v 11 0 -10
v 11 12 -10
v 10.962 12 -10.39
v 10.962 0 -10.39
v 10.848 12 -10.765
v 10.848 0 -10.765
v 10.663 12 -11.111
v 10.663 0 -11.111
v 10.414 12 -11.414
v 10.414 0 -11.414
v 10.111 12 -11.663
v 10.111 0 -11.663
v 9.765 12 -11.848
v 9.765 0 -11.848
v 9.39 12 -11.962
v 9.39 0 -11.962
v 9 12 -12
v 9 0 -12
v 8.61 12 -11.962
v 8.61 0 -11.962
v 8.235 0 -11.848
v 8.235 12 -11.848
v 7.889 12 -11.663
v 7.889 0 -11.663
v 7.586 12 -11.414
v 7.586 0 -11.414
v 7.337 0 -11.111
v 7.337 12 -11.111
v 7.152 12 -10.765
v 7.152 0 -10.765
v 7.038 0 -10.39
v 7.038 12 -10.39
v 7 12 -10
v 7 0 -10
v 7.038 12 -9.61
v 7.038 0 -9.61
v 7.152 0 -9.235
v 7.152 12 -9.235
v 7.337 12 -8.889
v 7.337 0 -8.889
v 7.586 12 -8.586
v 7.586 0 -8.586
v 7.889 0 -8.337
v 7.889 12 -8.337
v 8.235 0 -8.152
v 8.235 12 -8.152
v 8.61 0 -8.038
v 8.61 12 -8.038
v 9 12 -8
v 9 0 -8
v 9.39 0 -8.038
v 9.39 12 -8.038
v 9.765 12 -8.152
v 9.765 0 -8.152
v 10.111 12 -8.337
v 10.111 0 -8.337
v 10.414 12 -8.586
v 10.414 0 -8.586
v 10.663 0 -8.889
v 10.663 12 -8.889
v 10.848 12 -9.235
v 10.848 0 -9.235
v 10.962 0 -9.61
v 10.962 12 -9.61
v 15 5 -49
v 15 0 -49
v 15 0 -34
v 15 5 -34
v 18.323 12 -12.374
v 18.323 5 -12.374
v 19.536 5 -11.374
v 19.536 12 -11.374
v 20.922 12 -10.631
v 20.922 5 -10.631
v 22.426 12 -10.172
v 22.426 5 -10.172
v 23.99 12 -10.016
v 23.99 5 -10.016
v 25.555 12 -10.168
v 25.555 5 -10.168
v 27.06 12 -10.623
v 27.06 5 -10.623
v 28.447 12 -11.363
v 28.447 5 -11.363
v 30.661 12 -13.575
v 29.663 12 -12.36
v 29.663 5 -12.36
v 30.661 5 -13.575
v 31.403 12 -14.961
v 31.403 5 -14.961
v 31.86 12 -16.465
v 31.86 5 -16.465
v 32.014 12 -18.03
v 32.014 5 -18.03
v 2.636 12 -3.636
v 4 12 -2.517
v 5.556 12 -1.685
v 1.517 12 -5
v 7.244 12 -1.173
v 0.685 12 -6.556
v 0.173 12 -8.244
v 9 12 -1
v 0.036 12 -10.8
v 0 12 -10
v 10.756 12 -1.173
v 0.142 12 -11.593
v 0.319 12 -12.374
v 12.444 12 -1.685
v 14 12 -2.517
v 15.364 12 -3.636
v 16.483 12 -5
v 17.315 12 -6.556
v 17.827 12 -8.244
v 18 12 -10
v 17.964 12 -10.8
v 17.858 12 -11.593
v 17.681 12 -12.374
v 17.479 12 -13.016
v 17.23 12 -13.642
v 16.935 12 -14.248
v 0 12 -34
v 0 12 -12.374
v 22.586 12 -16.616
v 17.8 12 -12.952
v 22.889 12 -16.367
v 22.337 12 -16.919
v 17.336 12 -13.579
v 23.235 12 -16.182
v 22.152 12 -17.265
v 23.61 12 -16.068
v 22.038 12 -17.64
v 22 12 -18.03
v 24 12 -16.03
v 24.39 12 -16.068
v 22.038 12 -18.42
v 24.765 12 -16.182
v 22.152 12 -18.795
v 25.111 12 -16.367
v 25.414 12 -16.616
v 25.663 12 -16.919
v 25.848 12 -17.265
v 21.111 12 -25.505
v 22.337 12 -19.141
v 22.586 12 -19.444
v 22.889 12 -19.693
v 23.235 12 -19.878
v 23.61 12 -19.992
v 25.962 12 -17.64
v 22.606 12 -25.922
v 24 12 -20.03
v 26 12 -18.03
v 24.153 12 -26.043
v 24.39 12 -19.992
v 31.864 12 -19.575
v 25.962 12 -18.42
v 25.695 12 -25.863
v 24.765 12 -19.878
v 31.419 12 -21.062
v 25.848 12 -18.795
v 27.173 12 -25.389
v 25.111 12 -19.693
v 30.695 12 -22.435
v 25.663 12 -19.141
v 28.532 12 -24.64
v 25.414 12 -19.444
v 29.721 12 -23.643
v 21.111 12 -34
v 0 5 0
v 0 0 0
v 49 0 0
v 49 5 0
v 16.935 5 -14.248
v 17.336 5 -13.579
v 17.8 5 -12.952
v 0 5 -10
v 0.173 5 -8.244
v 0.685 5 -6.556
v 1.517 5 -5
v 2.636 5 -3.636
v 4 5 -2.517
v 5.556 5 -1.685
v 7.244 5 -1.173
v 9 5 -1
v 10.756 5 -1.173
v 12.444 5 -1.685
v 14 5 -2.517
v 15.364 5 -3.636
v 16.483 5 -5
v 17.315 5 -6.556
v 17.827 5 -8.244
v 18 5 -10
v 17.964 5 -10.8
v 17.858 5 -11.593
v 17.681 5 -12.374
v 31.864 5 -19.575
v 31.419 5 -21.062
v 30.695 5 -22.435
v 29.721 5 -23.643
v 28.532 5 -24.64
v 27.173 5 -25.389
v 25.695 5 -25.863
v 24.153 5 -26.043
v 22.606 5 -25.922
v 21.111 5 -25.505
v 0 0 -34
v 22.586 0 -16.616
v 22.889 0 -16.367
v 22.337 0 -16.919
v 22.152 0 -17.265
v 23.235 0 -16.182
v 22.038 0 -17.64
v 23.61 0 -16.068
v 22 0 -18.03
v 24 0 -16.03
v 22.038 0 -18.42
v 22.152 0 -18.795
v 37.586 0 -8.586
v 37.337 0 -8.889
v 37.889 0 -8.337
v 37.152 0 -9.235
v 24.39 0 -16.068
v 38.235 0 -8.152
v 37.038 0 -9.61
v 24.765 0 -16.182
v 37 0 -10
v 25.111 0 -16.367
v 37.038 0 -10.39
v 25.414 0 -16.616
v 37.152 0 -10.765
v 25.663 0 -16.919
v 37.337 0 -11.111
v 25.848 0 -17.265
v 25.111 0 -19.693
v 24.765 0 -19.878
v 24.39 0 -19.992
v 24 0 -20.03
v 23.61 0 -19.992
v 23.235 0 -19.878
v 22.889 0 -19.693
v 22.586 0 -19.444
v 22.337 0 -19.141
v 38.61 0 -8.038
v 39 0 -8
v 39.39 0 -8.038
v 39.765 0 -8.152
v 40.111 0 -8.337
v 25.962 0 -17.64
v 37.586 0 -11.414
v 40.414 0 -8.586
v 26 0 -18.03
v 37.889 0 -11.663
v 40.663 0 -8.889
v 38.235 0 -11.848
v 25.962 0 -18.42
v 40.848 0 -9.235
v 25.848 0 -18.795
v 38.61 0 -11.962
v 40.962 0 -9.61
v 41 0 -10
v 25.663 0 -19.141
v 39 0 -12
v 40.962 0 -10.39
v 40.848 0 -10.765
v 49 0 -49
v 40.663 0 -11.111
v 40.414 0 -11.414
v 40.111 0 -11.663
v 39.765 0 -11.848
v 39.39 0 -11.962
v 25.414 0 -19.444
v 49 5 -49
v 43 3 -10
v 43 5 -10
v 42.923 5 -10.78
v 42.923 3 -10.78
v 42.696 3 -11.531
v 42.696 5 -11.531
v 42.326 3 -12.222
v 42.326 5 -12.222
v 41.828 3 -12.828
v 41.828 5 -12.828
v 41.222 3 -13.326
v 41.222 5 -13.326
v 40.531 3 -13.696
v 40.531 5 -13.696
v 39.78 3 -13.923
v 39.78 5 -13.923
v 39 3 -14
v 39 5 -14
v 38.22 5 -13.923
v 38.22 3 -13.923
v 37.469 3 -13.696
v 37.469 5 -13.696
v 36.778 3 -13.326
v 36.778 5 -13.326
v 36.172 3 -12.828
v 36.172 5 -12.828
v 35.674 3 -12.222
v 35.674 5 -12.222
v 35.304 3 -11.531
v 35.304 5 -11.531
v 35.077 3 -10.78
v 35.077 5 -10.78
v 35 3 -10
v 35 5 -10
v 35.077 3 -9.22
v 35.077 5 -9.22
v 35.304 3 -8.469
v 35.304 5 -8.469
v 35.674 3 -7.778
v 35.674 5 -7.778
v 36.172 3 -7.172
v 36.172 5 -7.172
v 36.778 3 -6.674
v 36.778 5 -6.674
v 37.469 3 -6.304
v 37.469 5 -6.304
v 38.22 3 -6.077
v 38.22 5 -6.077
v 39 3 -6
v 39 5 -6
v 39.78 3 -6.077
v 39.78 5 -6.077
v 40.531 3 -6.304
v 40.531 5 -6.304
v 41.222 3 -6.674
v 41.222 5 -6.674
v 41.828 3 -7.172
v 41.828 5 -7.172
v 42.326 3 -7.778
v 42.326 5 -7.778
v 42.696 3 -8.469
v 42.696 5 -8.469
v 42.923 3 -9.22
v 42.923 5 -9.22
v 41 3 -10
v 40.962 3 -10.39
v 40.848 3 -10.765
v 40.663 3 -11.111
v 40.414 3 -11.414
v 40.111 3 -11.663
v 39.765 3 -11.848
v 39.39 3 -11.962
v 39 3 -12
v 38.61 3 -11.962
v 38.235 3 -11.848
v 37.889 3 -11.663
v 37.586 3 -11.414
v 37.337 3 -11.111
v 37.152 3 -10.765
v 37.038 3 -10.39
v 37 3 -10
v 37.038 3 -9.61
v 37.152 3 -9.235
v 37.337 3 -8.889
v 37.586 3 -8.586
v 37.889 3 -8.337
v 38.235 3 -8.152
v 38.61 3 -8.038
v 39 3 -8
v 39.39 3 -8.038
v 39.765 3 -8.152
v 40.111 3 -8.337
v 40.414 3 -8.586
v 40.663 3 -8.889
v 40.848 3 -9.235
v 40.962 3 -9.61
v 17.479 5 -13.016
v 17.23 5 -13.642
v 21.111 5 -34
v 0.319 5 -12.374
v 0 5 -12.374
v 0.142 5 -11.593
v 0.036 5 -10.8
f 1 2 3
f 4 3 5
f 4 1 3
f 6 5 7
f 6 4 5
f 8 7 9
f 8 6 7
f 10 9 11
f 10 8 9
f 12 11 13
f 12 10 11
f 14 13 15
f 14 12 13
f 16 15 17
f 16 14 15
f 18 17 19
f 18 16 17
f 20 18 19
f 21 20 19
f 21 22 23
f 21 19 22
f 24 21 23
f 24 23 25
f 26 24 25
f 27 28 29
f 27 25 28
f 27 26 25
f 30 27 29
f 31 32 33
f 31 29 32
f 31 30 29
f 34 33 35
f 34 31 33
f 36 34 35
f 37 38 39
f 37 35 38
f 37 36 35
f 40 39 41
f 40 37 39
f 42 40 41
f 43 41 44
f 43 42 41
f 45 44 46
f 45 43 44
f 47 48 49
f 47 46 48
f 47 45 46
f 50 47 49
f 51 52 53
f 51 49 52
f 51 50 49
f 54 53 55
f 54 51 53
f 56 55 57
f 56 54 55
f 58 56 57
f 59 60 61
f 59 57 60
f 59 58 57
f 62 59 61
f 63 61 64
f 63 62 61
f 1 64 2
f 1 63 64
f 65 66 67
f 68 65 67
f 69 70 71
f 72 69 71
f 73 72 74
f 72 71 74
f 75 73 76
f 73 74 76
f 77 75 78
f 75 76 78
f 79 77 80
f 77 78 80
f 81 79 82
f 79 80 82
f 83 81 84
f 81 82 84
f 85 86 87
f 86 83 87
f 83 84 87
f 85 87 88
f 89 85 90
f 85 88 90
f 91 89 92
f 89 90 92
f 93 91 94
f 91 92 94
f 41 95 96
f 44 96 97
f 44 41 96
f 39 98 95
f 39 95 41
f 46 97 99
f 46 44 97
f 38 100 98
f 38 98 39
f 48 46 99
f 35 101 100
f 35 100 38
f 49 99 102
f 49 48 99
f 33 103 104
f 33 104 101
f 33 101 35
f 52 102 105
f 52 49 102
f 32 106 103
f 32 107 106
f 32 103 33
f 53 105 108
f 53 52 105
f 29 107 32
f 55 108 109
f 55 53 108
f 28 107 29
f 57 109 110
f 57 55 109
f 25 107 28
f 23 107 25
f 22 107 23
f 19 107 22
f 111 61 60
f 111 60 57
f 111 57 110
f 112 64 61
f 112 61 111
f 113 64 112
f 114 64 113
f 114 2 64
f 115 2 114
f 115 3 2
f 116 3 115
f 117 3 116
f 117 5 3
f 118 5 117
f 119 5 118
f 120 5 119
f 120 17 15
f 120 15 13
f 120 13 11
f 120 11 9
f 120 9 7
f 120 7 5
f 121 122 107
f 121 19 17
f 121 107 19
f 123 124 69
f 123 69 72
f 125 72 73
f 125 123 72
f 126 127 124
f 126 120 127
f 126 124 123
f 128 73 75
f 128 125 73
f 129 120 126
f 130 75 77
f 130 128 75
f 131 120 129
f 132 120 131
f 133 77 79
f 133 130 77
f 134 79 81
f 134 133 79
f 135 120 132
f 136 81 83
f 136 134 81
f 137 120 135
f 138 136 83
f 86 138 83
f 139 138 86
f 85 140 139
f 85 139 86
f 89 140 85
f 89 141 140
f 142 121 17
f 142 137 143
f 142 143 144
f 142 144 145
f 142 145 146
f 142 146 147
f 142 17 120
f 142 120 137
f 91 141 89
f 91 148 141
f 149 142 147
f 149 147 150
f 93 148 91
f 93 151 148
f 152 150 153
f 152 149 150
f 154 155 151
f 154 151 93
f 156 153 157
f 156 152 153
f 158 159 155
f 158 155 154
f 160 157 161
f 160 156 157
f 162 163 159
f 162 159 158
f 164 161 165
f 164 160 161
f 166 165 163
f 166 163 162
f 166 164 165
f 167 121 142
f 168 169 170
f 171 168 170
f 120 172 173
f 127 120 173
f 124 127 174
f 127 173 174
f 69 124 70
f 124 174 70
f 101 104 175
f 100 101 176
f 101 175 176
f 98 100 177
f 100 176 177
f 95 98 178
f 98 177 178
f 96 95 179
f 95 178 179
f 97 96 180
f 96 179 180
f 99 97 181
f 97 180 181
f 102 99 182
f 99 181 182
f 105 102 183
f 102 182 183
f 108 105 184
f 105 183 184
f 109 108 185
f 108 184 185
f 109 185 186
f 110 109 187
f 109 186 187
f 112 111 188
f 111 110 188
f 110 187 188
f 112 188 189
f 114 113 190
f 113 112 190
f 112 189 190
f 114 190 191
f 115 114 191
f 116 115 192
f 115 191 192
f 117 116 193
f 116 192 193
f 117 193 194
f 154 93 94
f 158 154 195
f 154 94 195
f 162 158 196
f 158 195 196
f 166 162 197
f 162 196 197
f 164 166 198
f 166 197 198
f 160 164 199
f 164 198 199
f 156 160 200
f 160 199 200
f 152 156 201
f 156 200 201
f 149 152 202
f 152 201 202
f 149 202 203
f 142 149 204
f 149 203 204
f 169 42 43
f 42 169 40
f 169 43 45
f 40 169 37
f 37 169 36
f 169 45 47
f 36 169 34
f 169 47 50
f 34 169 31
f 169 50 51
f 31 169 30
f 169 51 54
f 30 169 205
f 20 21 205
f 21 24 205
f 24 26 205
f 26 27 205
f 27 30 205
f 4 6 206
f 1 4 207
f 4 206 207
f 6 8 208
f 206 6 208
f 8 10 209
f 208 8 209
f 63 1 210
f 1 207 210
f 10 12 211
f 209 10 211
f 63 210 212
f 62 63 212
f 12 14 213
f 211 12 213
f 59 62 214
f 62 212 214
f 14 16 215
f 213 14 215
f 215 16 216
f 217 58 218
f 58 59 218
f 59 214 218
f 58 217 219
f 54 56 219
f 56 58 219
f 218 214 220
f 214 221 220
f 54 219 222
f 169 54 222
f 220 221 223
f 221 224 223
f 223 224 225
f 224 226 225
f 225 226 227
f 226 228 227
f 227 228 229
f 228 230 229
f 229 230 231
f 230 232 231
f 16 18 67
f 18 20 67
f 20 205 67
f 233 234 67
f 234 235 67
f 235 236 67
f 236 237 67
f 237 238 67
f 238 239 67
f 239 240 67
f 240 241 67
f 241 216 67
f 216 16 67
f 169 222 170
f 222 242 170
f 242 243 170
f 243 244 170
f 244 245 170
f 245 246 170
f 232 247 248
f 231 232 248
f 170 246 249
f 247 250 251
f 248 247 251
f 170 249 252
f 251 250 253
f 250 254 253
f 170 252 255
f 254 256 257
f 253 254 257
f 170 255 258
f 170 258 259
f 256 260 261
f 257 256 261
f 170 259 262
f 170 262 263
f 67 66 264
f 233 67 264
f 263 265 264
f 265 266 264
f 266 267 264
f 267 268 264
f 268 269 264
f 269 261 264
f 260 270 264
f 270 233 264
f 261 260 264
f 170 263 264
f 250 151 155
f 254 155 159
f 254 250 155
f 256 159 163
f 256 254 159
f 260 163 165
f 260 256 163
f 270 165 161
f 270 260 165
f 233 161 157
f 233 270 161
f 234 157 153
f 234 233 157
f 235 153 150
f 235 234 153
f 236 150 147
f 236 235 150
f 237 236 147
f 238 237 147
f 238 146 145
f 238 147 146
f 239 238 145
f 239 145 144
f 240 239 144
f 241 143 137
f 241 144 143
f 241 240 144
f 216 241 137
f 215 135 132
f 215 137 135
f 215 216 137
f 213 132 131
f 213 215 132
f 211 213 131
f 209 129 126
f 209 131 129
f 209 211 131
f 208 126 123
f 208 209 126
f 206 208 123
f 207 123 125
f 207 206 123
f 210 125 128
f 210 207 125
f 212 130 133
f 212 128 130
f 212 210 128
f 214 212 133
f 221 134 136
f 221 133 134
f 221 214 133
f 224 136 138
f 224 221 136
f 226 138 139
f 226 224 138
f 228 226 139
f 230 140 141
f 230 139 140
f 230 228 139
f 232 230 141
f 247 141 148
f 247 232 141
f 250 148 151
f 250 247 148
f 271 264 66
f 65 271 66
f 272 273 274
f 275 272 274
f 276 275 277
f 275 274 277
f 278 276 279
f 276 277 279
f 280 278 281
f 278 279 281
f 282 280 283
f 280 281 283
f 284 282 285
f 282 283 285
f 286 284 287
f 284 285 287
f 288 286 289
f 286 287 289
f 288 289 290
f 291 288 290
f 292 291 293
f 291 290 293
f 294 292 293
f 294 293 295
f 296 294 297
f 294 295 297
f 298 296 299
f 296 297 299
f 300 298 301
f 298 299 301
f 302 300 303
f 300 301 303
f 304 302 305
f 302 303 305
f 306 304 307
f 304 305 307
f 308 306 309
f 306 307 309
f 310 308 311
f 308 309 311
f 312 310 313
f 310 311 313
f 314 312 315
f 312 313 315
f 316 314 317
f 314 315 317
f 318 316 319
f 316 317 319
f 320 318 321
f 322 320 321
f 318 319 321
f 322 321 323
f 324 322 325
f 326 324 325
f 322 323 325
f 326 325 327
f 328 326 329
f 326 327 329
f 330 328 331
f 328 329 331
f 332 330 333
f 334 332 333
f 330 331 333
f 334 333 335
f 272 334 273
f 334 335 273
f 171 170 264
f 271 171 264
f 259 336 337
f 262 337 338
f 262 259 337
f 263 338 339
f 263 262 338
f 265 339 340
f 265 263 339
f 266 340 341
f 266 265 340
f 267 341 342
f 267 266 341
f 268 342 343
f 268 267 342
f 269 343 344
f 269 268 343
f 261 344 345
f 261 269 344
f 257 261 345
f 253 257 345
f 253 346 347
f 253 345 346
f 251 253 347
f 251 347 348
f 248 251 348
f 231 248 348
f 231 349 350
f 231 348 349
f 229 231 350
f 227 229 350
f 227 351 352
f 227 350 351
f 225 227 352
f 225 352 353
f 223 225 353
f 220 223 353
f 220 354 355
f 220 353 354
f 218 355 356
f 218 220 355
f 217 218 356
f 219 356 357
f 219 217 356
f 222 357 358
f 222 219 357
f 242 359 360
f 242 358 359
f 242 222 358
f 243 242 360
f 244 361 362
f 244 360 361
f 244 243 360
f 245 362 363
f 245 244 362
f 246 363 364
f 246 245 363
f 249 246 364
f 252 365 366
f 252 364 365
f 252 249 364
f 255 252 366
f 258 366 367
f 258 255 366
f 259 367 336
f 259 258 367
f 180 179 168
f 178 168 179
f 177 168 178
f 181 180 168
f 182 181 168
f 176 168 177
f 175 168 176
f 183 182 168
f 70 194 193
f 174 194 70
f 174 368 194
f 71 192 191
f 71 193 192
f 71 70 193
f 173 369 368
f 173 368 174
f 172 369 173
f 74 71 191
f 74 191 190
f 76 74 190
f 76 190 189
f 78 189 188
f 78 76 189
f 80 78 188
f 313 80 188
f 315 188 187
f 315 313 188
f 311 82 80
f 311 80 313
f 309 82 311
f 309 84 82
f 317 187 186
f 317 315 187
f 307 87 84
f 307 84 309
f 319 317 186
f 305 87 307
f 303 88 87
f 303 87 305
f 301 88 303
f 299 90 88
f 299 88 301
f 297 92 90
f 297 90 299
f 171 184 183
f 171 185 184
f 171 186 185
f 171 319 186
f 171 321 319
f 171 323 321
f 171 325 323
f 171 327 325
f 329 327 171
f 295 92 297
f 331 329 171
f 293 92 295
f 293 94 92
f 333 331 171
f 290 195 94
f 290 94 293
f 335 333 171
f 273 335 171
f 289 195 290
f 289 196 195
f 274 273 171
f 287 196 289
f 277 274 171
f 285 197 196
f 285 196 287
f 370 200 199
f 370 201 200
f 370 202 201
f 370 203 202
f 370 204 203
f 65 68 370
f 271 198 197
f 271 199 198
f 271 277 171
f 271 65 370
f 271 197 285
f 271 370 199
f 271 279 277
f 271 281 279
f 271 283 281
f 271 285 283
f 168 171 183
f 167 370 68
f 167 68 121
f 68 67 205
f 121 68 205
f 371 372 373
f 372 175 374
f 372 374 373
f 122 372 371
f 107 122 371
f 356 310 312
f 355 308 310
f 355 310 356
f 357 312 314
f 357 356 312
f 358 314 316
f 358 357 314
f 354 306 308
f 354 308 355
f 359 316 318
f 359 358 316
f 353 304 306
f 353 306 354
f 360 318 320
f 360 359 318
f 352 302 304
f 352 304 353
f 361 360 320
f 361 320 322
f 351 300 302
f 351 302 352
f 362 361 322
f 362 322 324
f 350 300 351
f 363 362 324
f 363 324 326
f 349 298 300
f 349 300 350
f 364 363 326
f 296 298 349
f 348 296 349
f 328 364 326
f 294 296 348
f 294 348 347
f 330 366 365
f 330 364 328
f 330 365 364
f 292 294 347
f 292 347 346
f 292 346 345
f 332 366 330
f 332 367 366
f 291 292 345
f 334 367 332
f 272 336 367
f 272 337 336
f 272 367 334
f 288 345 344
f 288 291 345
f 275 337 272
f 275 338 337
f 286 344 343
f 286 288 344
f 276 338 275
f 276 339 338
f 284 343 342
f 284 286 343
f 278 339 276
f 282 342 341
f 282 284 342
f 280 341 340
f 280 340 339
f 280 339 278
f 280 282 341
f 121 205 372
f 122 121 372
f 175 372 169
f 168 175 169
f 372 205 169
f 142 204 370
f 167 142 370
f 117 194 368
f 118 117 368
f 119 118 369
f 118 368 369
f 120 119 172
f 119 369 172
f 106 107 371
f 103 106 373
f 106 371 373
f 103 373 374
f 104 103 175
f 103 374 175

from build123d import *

# Parameters (mm, degrees)
SKETCH1_R           = 2
BOSS_EXTRUDE1_DEPTH = 5
SKETCH2_R           = 4
CUT_EXTRUDE1_DEPTH  = 2
SKETCH3_R           = 2
BOSS_EXTRUDE2_DEPTH = 12
SKETCH4_W           = 51.589864231
SKETCH4_H           = 45.63525298
CUT_EXTRUDE2_DEPTH  = 5


with BuildPart() as part:
    # Sketch1 → Boss-Extrude1 (new body)
    with BuildSketch(Plane(origin=(0, 0, 0), x_dir=(1, 0, 0), z_dir=(0, 1, 0))):
        Polygon((0, 34), (0, 0), (49, 0), (49, 49), (15, 49), (15, 34), align=None)
        with Locations((9, 10)):
            Circle(SKETCH1_R, mode=Mode.SUBTRACT)
        with Locations((24, 18.03)):
            Circle(SKETCH1_R, mode=Mode.SUBTRACT)
        with Locations((39, 10)):
            Circle(SKETCH1_R, mode=Mode.SUBTRACT)
    extrude(amount=BOSS_EXTRUDE1_DEPTH)

    # Sketch2 → Cut-Extrude1 (cut)
    with BuildSketch(Plane(origin=(0, 5, 0), x_dir=(1, 0, 0), z_dir=(0, 1, 0))):
        with Locations((39, 10)):
            Circle(SKETCH2_R)
    extrude(amount=-CUT_EXTRUDE1_DEPTH, mode=Mode.SUBTRACT)

    # Sketch3 → Boss-Extrude2 (add)
    with BuildSketch(Plane(origin=(0, 5, 0), x_dir=(1, 0, 0), z_dir=(0, 1, 0))):
        with BuildLine():
            Line((15, 34), (0, 34))
            Line((0, 34), (0, 12.373527554))
            Line((0, 12.373527554), (0.318619525, 12.373527554))
            ThreePointArc((0.318619525, 12.373527554), (7.991284246, 18.943293159), (16.934577194, 14.247644612))
            ThreePointArc((16.934577194, 14.247644612), (16.486188802, 20.817302098), (21.110631854, 25.505156415))
            Line((21.110631854, 25.505156415), (21.110631854, 34))
            Line((21.110631854, 34), (15, 34))
        make_face()
        with BuildLine():
            Line((21.110631854, 12.373527554), (21.110631854, 25.505156415))
            ThreePointArc((21.110631854, 25.505156415), (16.486188802, 20.817302098), (16.934577194, 14.247644612))
            ThreePointArc((16.934577194, 14.247644612), (17.560142752, 13.25981653), (18.322788434, 12.373527554))
            Line((18.322788434, 12.373527554), (21.110631854, 12.373527554))
        make_face()
        with BuildLine():
            ThreePointArc((16.934577194, 14.247644612), (7.991284246, 18.943293159), (0.318619525, 12.373527554))
            Line((0.318619525, 12.373527554), (17.681380475, 12.373527554))
            ThreePointArc((17.681380475, 12.373527554), (17.360657331, 13.331577554), (16.934577194, 14.247644612))
        make_face()
        with BuildLine():
            ThreePointArc((32.014138239, 18.03), (28.531590006, 24.639924638), (21.110631854, 25.505156415))
            Line((21.110631854, 25.505156415), (21.110631854, 12.373527554))
            Line((21.110631854, 12.373527554), (18.322788434, 12.373527554))
            ThreePointArc((18.322788434, 12.373527554), (27.060102401, 10.623098826), (32.014138239, 18.03))
        make_face()
        with Locations((24, 18.03)):
            Circle(SKETCH3_R, mode=Mode.SUBTRACT)
        with BuildLine():
            Line((17.681380475, 12.373527554), (0.318619525, 12.373527554))
            ThreePointArc((0.318619525, 12.373527554), (0.08001053, 11.197408812), (0, 10))
            ThreePointArc((0, 10), (9, 1), (18, 10))
            ThreePointArc((18, 10), (17.91998947, 11.197408812), (17.681380475, 12.373527554))
        make_face()
        with Locations((9, 10)):
            Circle(SKETCH3_R, mode=Mode.SUBTRACT)
    extrude(amount=BOSS_EXTRUDE2_DEPTH)

    # Sketch4 → Cut-Extrude2 (cut)
    with BuildSketch(Plane(origin=(0, 17, 0), x_dir=(1, 0, 0), z_dir=(0, 1, 0))):
        with Locations((25.794932115, 11.18237351)):
            Rectangle(SKETCH4_W, SKETCH4_H)
    extrude(amount=-CUT_EXTRUDE2_DEPTH, mode=Mode.SUBTRACT)


solid = part.part
